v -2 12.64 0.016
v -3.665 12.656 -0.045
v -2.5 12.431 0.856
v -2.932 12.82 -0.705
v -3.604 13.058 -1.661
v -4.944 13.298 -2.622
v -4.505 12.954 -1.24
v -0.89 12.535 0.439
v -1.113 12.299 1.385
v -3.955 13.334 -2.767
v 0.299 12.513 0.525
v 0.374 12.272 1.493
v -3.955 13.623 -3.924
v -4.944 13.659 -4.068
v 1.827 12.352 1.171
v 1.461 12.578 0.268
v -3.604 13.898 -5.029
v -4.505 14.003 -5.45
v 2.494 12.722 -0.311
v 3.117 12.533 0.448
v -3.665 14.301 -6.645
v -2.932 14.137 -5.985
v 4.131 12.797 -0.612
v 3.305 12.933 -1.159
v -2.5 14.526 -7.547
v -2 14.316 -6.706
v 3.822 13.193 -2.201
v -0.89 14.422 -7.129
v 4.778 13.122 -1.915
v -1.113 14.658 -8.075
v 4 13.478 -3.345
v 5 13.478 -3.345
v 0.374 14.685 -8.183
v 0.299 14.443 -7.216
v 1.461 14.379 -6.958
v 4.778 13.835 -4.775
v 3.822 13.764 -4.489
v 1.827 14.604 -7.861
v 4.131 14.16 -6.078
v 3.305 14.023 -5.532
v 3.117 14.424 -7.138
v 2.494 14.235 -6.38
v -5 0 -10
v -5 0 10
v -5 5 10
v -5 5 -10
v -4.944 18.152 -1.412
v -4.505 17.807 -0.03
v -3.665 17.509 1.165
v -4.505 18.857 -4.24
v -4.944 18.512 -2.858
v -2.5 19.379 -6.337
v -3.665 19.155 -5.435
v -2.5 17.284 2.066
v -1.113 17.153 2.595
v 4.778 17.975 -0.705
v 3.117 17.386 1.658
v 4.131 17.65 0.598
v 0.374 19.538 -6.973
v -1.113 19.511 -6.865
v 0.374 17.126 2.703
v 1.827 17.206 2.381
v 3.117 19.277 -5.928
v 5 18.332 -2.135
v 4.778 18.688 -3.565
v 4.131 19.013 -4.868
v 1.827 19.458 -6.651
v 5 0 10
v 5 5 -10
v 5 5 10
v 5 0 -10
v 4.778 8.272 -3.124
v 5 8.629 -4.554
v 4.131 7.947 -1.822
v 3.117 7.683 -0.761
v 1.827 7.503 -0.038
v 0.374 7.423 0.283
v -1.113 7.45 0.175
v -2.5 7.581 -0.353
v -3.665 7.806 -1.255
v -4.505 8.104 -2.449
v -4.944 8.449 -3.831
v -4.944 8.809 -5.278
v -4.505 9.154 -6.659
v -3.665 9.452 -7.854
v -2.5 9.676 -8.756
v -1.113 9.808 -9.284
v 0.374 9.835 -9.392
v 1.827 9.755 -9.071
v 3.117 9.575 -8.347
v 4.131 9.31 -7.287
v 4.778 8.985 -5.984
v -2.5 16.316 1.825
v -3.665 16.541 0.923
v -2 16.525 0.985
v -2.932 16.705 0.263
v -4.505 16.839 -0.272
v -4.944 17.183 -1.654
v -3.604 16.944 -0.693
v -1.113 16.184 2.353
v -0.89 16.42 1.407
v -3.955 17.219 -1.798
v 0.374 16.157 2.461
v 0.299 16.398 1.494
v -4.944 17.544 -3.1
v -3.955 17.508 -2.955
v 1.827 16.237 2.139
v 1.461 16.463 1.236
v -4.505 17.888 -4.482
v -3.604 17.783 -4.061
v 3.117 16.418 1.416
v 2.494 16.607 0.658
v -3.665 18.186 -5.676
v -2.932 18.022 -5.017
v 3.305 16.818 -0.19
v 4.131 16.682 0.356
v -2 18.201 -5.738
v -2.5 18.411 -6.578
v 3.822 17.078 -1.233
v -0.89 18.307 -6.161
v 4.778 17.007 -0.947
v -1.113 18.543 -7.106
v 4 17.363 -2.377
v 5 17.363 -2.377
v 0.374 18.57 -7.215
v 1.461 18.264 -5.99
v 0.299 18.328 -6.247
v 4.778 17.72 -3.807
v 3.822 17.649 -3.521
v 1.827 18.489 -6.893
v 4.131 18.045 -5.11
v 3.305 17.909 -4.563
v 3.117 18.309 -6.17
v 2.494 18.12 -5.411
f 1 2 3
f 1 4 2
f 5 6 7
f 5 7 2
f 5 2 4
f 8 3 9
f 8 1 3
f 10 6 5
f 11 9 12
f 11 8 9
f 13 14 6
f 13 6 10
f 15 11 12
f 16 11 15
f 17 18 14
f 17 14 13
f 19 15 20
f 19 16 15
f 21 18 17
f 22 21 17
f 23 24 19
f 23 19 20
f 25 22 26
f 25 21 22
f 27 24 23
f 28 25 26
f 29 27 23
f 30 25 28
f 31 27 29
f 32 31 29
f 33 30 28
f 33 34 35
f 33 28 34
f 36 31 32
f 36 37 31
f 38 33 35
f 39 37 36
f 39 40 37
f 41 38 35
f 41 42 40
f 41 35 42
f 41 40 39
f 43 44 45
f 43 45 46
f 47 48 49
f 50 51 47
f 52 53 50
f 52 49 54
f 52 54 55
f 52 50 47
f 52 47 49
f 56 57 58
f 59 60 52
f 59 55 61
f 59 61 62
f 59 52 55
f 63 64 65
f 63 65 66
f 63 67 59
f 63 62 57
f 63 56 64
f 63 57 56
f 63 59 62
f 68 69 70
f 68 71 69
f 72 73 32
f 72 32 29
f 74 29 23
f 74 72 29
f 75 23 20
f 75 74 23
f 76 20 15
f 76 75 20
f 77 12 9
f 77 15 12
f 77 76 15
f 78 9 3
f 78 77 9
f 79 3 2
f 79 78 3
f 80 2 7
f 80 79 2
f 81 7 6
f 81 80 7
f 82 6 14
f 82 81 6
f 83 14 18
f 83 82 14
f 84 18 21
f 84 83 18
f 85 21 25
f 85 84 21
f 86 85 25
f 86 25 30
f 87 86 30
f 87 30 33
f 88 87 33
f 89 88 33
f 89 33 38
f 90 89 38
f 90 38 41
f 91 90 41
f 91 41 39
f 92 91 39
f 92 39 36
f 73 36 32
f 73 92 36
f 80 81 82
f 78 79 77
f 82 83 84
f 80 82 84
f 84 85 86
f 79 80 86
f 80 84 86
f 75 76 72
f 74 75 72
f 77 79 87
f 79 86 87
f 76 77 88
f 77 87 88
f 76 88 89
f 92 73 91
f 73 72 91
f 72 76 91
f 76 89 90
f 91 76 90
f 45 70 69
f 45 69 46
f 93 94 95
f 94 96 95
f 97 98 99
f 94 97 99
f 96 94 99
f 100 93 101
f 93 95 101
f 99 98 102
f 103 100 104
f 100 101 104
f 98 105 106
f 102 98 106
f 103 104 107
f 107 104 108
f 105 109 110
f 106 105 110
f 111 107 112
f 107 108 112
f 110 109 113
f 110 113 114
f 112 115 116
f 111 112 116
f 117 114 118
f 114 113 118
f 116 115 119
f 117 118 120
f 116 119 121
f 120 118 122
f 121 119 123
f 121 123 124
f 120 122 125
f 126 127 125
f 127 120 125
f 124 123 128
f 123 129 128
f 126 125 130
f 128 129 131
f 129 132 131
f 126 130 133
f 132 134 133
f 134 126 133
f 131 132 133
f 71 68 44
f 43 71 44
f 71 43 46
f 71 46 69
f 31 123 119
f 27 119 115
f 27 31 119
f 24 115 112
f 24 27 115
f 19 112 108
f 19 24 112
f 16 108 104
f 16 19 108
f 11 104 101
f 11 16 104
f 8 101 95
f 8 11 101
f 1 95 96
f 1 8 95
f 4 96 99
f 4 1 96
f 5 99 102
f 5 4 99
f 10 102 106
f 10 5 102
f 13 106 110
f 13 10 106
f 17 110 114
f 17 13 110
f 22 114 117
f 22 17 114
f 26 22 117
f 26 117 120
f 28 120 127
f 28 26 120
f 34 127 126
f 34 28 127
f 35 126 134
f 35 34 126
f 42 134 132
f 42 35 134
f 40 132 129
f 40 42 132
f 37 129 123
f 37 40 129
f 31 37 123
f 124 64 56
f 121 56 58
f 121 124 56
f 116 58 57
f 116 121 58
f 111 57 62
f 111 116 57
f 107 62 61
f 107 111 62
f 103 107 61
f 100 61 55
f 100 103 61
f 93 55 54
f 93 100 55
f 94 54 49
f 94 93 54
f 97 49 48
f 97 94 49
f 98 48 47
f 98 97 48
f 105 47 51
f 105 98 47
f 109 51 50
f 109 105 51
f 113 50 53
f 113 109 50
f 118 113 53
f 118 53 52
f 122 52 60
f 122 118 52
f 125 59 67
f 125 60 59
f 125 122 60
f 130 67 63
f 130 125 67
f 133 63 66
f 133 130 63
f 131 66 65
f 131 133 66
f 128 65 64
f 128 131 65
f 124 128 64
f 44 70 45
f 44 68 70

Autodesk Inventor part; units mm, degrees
ref_plane "YZ Plane" through (0, 0, 0) normal (1, 0, 0) x (0, 1, 0)
ref_plane "XZ Plane" through (0, 0, 0) normal (0, 1, 0) x (-1, 0, 0)
ref_plane "XY Plane" through (0, 0, 0) normal (0, 0, 1) x (1, 0, 0)
sketch "Sketch1" plane through (0, 0, 0) normal (1, 0, 0) x (0, 1, 0)
  point P0 (0, 0)
sketch "Sketch2" plane through (0, 0, 0) normal (0, 1, 0) x (-1, 0, 0)
  line L0 (5, -10) -> (-5, -10)
  line L1 (-5, -10) -> (-5, 10)
  line L2 (-5, 10) -> (5, 10)
  line L3 (5, 10) -> (5, -10)
  line L4 (5, -10) -> (-5, 10) construction
  line L5 (-5, -10) -> (5, 10) construction
  point P0 (0, 0)
  dimension "d0" = 10
  dimension "d1" = 20
extrude "Extrusion1" add sketch "Sketch2" along normal blind 5
ref_plane "Work Plane2" through (-5, 5, 10) normal (0, 0.9702957, 0.2419219) x (1, 0, 0)
sketch "Sketch3" plane through (-5, 5, 10) normal (0, 0.9702957, 0.2419219) x (1, 0, 0)
  circle A0 centre (5, 15) radius 5
  line L0 (0, 0) -> (10, 0) projected
  point P0 (5, 8.4933)
  point P1 (5, 0)
  dimension "d6" = 10
  dimension "d7" = 15
extrude "Extrusion2" add sketch "Sketch3" along normal blind 10
ref_plane "Work Plane3" through (0, 13.4803, -3.3448) normal (0, 0.9702957, 0.2419219) x (1, 0, 0)
sketch "Sketch4" plane through (0, 13.4803, -3.3448) normal (0, 0.9702957, 0.2419219) x (1, 0, 0)
  circle A0 centre (0, 0) radius 5
  circle A1 centre (0, 0) radius 4
  point P0 (0, -6.5067)
  dimension "d11" = 8
extrude "Extrusion3" cut sketch "Sketch4" along normal blind 4
equation "\"d8\" = d6"
properties part number "HGT"
